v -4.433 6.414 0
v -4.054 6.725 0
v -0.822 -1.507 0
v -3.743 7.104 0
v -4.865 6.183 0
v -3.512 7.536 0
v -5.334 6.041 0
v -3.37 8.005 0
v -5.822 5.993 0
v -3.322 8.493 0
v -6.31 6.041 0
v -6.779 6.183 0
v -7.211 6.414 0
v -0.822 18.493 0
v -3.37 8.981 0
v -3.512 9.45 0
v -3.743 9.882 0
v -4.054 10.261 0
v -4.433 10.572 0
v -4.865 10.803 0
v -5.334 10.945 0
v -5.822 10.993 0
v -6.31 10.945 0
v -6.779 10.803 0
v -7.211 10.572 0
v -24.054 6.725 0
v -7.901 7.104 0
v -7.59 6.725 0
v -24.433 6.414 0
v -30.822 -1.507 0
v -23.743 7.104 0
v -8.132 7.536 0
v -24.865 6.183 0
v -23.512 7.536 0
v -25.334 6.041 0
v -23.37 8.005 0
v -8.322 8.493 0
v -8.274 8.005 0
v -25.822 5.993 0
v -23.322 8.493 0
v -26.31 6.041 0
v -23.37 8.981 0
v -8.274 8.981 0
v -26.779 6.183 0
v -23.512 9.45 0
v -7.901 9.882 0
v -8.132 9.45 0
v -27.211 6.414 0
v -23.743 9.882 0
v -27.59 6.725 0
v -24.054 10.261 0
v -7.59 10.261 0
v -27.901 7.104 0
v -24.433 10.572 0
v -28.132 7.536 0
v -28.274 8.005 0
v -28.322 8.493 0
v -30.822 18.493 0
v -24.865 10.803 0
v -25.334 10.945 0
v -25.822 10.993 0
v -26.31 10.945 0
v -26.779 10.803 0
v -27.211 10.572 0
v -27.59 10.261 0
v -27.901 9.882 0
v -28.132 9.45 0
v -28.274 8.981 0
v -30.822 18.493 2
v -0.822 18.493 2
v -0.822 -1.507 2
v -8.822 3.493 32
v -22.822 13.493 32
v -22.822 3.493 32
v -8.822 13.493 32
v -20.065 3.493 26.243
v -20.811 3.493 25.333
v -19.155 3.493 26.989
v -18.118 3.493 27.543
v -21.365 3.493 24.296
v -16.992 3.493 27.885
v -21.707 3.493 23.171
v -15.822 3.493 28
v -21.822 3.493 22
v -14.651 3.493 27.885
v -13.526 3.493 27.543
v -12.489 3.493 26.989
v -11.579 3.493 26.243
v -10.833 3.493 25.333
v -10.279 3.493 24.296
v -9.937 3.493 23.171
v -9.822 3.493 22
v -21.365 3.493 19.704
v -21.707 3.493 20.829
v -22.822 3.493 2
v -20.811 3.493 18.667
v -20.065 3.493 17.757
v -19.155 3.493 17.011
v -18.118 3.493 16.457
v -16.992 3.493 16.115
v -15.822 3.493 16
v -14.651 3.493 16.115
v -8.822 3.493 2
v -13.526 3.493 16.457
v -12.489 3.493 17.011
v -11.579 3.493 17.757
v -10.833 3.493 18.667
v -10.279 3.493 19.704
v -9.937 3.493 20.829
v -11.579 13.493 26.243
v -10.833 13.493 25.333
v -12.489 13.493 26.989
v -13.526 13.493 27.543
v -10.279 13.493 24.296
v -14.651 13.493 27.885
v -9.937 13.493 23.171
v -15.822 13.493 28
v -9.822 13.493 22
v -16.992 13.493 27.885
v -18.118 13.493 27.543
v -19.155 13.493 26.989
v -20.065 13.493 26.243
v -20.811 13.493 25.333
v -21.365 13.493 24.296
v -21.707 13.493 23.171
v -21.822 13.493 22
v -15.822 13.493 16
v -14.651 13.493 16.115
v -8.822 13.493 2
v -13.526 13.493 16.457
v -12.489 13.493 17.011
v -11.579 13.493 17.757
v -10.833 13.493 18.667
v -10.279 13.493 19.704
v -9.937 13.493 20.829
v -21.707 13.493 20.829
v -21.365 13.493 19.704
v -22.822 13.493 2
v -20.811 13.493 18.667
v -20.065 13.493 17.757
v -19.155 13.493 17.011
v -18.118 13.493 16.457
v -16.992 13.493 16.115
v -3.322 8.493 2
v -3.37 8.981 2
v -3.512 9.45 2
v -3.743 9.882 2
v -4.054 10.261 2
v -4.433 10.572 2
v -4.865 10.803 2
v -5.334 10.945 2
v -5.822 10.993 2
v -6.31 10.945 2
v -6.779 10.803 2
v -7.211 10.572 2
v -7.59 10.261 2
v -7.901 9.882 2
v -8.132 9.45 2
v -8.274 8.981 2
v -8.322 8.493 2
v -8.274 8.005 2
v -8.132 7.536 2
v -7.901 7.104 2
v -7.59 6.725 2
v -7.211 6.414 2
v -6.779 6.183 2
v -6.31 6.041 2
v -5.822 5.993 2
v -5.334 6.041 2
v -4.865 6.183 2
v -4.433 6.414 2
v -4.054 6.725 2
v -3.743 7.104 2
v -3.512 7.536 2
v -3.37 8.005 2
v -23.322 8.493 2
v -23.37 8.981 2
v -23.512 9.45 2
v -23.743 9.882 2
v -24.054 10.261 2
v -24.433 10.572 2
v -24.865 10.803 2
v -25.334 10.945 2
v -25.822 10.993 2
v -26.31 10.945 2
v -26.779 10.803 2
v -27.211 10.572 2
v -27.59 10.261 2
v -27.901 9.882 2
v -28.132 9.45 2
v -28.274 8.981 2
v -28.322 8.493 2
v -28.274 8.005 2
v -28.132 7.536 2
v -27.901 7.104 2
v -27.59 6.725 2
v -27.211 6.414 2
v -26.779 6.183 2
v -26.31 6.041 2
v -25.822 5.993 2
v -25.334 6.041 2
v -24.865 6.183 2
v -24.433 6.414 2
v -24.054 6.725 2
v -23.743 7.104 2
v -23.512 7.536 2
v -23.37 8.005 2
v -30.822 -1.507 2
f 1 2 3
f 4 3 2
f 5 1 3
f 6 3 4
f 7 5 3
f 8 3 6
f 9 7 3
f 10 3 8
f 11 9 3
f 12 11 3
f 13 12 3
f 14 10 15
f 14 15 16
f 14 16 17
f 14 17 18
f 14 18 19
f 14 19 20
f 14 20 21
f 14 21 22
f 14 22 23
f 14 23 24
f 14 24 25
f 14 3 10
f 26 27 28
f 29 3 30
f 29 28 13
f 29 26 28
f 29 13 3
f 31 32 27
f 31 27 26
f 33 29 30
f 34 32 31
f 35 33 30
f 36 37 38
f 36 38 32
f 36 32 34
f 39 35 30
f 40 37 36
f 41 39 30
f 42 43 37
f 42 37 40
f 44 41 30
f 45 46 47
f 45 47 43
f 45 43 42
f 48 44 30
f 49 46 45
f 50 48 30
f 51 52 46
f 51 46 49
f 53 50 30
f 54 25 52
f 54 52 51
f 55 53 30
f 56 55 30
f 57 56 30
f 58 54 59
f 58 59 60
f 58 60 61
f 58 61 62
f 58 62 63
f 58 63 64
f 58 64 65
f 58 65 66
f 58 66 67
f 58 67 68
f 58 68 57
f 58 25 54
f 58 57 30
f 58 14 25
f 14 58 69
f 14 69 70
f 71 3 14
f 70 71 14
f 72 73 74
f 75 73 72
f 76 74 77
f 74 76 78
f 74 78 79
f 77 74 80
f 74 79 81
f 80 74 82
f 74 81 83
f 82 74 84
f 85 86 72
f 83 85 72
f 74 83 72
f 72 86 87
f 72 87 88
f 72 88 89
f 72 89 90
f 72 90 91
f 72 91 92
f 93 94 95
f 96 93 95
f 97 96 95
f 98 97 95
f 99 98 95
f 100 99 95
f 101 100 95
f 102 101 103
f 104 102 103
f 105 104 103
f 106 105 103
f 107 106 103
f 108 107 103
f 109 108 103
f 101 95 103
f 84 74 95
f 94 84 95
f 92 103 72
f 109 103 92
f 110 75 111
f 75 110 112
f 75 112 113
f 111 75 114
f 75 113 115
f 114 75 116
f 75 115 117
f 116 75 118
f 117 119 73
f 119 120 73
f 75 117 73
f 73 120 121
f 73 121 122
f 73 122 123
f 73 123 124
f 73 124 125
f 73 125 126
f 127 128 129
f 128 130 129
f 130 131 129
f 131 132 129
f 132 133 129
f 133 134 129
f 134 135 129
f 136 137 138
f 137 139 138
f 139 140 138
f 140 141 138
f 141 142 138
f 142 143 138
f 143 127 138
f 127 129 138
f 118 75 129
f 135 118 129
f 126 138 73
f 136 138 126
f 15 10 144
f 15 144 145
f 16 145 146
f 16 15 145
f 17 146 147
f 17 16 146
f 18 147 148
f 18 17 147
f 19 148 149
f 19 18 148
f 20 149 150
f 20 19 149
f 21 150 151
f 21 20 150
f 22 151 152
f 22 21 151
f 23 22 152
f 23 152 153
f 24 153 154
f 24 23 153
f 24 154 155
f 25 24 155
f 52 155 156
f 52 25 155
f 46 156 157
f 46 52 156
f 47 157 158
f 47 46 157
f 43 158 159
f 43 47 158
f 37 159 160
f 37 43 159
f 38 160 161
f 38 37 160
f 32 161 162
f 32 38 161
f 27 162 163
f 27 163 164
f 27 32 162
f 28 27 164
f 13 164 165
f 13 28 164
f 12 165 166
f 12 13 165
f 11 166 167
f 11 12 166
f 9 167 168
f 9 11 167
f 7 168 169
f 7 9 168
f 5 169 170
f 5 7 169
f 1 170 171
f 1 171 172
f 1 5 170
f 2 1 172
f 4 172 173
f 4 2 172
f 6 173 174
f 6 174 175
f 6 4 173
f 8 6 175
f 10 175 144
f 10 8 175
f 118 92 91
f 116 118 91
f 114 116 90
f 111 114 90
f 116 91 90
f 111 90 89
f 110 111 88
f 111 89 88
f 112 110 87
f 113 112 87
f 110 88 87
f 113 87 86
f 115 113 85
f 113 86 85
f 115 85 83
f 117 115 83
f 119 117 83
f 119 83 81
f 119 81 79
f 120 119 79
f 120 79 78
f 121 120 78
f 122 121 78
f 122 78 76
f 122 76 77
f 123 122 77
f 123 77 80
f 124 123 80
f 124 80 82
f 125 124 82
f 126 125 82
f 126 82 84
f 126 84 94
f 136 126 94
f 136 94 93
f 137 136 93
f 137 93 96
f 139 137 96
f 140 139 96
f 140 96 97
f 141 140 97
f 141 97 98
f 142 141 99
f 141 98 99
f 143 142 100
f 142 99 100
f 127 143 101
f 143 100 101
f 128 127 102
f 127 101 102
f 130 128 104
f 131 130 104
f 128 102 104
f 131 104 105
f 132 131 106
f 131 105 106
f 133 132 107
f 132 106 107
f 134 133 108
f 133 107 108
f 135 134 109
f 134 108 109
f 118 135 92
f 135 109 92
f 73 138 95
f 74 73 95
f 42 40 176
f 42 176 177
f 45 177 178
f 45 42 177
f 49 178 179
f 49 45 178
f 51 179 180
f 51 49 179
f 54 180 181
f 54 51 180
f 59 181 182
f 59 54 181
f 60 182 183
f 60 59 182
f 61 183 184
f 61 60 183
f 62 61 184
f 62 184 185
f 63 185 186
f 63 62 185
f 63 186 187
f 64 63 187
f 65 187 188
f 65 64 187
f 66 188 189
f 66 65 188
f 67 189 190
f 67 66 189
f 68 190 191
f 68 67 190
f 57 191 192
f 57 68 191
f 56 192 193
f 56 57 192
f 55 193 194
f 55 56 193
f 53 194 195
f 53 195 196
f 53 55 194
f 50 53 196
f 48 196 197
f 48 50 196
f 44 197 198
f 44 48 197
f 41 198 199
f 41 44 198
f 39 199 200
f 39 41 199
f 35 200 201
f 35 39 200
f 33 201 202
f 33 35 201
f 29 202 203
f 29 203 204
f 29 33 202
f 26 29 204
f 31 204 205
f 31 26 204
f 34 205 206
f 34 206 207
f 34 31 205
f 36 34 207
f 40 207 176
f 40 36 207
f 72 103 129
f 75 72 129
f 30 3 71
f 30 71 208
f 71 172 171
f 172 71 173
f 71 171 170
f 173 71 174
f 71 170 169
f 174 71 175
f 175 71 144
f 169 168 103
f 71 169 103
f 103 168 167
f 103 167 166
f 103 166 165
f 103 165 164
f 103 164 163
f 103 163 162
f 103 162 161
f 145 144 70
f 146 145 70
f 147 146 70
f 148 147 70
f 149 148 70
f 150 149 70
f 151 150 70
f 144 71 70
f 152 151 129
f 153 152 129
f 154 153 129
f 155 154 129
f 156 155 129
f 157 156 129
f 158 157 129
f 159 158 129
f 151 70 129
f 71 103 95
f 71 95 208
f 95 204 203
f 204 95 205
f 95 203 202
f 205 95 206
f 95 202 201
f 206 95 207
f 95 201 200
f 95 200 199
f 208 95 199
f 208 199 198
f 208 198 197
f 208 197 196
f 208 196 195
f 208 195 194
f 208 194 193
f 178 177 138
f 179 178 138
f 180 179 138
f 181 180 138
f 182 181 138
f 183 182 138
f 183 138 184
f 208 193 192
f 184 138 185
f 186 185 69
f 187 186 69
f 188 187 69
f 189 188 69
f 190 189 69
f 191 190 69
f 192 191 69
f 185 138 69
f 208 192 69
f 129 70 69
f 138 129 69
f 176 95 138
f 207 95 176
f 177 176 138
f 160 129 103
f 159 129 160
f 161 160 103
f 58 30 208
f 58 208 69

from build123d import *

# Parameters (mm, degrees)
SKETCH_1_R          = 2.5
EXTRUDE_1_DEPTH     = 2
EXTRUDE_2_DEPTH     = 30
SKETCH_4_R          = 6
CUT_EXTRUDE_1_DEPTH = 15


with BuildPart() as part:
    # 草图1 → 凸台-拉伸1 (new body)
    with BuildSketch(Plane.XY):
        Polygon((-30.821938658, 18.493163195), (-0.821938658, 18.493163195), (-0.821938658, 8.493163195), (-0.821938658, -1.506836805), (-30.821938658, -1.506836805), align=None)
        with Locations((-25.821938658, 8.493163195)):
            Circle(SKETCH_1_R, mode=Mode.SUBTRACT)
        with Locations((-5.821938658, 8.493163195)):
            Circle(SKETCH_1_R, mode=Mode.SUBTRACT)
    extrude(amount=EXTRUDE_1_DEPTH)

    # 草图2 → 凸台-拉伸2 (add)
    with BuildSketch(Plane.XY.offset(2)):
        Polygon((-22.821938658, 3.493163195), (-8.821938658, 3.493163195), (-8.821938658, 13.493163195), (-15.821938658, 13.493163195), (-22.821938658, 13.493163195), align=None)
    extrude(amount=EXTRUDE_2_DEPTH)

    # 草图4 → 切除-拉伸1 (cut)
    with BuildSketch(Plane.XZ.offset(-3.493163195)):
        with Locations((-15.821938658, 22)):
            Circle(SKETCH_4_R)
    extrude(amount=-CUT_EXTRUDE_1_DEPTH, mode=Mode.SUBTRACT)


solid = part.part
